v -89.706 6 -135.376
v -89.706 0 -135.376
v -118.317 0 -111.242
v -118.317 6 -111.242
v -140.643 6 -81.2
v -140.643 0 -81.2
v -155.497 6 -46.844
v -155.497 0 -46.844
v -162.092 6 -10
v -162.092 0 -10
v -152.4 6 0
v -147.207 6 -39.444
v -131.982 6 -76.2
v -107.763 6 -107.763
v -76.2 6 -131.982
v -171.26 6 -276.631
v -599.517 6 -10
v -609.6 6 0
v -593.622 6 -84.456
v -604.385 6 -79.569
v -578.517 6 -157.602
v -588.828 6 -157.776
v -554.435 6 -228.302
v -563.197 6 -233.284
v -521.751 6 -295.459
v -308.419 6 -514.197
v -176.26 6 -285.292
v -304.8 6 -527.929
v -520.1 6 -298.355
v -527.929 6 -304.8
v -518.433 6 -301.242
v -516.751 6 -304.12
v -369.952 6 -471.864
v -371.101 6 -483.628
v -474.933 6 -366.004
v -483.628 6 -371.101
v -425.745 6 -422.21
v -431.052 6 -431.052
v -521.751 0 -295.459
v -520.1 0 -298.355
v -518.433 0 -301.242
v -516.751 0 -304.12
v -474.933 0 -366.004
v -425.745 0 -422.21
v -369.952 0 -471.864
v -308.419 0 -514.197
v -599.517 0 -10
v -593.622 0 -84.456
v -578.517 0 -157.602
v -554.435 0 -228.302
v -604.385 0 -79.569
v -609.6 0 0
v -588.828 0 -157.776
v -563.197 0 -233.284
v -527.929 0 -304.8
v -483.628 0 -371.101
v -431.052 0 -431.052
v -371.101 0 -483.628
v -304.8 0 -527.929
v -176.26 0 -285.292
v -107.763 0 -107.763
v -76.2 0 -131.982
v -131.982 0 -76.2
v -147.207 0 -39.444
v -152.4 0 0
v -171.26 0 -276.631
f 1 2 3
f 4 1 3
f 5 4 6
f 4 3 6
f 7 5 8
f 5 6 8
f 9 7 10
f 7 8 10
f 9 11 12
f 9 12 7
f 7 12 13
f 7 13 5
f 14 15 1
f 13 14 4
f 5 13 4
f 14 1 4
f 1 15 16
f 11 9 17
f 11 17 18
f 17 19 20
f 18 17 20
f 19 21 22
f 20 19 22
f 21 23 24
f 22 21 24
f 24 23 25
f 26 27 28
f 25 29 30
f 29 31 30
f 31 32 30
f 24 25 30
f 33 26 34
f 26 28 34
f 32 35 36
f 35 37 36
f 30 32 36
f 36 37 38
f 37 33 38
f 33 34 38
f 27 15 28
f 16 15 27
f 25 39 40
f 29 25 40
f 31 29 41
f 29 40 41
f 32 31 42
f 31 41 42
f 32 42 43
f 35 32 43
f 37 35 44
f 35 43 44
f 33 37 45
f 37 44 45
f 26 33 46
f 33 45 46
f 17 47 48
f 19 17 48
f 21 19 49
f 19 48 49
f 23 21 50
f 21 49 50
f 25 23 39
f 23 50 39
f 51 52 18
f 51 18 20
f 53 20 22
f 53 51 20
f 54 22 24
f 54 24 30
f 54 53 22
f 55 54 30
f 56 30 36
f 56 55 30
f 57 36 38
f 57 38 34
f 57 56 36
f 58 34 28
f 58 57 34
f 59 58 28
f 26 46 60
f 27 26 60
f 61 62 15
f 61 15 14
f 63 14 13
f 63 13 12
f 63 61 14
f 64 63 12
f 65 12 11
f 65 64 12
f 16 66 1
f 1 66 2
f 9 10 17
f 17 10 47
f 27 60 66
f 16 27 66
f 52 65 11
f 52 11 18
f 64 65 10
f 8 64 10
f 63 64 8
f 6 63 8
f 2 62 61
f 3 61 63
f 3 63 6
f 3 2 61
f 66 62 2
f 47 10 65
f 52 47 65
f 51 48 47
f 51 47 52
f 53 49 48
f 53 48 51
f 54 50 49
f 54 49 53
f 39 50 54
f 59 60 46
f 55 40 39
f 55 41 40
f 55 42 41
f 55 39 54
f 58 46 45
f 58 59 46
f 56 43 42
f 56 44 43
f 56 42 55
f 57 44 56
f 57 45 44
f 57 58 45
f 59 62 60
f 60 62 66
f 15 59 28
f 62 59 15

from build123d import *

# Parameters (mm, degrees)
BOSS_EXTRUDE1_DEPTH = 6


with BuildPart() as part:
    # Sketch1 → Boss-Extrude1 (new body)
    with BuildSketch(Plane(origin=(0, 0, 0), x_dir=(1, 0, 0), z_dir=(0, 1, 0))):
        with BuildLine():
            ThreePointArc((-76.2, 131.982271537), (-131.982271537, 76.2), (-152.4, 0))
            Line((-152.4, 0), (-609.6, 0))
            ThreePointArc((-609.6, 0), (-527.929086147, 304.8), (-304.8, 527.929086147))
            Line((-304.8, 527.929086147), (-76.2, 131.982271537))
        make_face()
        with BuildLine():
            ThreePointArc((-599.516605275, 10), (-578.516992176, 157.601553812), (-521.750777563, 295.459449184))
            ThreePointArc((-521.750777563, 295.459449184), (-519.268832109, 299.8), (-516.750777563, 304.119703222))
            ThreePointArc((-516.750777563, 304.119703222), (-425.745445365, 422.209634839), (-308.418556675, 514.196610158))
            Line((-308.418556675, 514.196610158), (-176.260254038, 285.291715349))
            Line((-176.260254038, 285.291715349), (-171.260254038, 276.631461311))
            Line((-171.260254038, 276.631461311), (-89.706166951, 135.375638912))
            ThreePointArc((-89.706166951, 135.375638912), (-140.642525575, 81.2), (-162.091825827, 10))
            Line((-162.091825827, 10), (-325.2, 10))
            Line((-325.2, 10), (-335.2, 10))
            Line((-335.2, 10), (-599.516605275, 10))
        make_face(mode=Mode.SUBTRACT)
    extrude(amount=BOSS_EXTRUDE1_DEPTH)


solid = part.part
